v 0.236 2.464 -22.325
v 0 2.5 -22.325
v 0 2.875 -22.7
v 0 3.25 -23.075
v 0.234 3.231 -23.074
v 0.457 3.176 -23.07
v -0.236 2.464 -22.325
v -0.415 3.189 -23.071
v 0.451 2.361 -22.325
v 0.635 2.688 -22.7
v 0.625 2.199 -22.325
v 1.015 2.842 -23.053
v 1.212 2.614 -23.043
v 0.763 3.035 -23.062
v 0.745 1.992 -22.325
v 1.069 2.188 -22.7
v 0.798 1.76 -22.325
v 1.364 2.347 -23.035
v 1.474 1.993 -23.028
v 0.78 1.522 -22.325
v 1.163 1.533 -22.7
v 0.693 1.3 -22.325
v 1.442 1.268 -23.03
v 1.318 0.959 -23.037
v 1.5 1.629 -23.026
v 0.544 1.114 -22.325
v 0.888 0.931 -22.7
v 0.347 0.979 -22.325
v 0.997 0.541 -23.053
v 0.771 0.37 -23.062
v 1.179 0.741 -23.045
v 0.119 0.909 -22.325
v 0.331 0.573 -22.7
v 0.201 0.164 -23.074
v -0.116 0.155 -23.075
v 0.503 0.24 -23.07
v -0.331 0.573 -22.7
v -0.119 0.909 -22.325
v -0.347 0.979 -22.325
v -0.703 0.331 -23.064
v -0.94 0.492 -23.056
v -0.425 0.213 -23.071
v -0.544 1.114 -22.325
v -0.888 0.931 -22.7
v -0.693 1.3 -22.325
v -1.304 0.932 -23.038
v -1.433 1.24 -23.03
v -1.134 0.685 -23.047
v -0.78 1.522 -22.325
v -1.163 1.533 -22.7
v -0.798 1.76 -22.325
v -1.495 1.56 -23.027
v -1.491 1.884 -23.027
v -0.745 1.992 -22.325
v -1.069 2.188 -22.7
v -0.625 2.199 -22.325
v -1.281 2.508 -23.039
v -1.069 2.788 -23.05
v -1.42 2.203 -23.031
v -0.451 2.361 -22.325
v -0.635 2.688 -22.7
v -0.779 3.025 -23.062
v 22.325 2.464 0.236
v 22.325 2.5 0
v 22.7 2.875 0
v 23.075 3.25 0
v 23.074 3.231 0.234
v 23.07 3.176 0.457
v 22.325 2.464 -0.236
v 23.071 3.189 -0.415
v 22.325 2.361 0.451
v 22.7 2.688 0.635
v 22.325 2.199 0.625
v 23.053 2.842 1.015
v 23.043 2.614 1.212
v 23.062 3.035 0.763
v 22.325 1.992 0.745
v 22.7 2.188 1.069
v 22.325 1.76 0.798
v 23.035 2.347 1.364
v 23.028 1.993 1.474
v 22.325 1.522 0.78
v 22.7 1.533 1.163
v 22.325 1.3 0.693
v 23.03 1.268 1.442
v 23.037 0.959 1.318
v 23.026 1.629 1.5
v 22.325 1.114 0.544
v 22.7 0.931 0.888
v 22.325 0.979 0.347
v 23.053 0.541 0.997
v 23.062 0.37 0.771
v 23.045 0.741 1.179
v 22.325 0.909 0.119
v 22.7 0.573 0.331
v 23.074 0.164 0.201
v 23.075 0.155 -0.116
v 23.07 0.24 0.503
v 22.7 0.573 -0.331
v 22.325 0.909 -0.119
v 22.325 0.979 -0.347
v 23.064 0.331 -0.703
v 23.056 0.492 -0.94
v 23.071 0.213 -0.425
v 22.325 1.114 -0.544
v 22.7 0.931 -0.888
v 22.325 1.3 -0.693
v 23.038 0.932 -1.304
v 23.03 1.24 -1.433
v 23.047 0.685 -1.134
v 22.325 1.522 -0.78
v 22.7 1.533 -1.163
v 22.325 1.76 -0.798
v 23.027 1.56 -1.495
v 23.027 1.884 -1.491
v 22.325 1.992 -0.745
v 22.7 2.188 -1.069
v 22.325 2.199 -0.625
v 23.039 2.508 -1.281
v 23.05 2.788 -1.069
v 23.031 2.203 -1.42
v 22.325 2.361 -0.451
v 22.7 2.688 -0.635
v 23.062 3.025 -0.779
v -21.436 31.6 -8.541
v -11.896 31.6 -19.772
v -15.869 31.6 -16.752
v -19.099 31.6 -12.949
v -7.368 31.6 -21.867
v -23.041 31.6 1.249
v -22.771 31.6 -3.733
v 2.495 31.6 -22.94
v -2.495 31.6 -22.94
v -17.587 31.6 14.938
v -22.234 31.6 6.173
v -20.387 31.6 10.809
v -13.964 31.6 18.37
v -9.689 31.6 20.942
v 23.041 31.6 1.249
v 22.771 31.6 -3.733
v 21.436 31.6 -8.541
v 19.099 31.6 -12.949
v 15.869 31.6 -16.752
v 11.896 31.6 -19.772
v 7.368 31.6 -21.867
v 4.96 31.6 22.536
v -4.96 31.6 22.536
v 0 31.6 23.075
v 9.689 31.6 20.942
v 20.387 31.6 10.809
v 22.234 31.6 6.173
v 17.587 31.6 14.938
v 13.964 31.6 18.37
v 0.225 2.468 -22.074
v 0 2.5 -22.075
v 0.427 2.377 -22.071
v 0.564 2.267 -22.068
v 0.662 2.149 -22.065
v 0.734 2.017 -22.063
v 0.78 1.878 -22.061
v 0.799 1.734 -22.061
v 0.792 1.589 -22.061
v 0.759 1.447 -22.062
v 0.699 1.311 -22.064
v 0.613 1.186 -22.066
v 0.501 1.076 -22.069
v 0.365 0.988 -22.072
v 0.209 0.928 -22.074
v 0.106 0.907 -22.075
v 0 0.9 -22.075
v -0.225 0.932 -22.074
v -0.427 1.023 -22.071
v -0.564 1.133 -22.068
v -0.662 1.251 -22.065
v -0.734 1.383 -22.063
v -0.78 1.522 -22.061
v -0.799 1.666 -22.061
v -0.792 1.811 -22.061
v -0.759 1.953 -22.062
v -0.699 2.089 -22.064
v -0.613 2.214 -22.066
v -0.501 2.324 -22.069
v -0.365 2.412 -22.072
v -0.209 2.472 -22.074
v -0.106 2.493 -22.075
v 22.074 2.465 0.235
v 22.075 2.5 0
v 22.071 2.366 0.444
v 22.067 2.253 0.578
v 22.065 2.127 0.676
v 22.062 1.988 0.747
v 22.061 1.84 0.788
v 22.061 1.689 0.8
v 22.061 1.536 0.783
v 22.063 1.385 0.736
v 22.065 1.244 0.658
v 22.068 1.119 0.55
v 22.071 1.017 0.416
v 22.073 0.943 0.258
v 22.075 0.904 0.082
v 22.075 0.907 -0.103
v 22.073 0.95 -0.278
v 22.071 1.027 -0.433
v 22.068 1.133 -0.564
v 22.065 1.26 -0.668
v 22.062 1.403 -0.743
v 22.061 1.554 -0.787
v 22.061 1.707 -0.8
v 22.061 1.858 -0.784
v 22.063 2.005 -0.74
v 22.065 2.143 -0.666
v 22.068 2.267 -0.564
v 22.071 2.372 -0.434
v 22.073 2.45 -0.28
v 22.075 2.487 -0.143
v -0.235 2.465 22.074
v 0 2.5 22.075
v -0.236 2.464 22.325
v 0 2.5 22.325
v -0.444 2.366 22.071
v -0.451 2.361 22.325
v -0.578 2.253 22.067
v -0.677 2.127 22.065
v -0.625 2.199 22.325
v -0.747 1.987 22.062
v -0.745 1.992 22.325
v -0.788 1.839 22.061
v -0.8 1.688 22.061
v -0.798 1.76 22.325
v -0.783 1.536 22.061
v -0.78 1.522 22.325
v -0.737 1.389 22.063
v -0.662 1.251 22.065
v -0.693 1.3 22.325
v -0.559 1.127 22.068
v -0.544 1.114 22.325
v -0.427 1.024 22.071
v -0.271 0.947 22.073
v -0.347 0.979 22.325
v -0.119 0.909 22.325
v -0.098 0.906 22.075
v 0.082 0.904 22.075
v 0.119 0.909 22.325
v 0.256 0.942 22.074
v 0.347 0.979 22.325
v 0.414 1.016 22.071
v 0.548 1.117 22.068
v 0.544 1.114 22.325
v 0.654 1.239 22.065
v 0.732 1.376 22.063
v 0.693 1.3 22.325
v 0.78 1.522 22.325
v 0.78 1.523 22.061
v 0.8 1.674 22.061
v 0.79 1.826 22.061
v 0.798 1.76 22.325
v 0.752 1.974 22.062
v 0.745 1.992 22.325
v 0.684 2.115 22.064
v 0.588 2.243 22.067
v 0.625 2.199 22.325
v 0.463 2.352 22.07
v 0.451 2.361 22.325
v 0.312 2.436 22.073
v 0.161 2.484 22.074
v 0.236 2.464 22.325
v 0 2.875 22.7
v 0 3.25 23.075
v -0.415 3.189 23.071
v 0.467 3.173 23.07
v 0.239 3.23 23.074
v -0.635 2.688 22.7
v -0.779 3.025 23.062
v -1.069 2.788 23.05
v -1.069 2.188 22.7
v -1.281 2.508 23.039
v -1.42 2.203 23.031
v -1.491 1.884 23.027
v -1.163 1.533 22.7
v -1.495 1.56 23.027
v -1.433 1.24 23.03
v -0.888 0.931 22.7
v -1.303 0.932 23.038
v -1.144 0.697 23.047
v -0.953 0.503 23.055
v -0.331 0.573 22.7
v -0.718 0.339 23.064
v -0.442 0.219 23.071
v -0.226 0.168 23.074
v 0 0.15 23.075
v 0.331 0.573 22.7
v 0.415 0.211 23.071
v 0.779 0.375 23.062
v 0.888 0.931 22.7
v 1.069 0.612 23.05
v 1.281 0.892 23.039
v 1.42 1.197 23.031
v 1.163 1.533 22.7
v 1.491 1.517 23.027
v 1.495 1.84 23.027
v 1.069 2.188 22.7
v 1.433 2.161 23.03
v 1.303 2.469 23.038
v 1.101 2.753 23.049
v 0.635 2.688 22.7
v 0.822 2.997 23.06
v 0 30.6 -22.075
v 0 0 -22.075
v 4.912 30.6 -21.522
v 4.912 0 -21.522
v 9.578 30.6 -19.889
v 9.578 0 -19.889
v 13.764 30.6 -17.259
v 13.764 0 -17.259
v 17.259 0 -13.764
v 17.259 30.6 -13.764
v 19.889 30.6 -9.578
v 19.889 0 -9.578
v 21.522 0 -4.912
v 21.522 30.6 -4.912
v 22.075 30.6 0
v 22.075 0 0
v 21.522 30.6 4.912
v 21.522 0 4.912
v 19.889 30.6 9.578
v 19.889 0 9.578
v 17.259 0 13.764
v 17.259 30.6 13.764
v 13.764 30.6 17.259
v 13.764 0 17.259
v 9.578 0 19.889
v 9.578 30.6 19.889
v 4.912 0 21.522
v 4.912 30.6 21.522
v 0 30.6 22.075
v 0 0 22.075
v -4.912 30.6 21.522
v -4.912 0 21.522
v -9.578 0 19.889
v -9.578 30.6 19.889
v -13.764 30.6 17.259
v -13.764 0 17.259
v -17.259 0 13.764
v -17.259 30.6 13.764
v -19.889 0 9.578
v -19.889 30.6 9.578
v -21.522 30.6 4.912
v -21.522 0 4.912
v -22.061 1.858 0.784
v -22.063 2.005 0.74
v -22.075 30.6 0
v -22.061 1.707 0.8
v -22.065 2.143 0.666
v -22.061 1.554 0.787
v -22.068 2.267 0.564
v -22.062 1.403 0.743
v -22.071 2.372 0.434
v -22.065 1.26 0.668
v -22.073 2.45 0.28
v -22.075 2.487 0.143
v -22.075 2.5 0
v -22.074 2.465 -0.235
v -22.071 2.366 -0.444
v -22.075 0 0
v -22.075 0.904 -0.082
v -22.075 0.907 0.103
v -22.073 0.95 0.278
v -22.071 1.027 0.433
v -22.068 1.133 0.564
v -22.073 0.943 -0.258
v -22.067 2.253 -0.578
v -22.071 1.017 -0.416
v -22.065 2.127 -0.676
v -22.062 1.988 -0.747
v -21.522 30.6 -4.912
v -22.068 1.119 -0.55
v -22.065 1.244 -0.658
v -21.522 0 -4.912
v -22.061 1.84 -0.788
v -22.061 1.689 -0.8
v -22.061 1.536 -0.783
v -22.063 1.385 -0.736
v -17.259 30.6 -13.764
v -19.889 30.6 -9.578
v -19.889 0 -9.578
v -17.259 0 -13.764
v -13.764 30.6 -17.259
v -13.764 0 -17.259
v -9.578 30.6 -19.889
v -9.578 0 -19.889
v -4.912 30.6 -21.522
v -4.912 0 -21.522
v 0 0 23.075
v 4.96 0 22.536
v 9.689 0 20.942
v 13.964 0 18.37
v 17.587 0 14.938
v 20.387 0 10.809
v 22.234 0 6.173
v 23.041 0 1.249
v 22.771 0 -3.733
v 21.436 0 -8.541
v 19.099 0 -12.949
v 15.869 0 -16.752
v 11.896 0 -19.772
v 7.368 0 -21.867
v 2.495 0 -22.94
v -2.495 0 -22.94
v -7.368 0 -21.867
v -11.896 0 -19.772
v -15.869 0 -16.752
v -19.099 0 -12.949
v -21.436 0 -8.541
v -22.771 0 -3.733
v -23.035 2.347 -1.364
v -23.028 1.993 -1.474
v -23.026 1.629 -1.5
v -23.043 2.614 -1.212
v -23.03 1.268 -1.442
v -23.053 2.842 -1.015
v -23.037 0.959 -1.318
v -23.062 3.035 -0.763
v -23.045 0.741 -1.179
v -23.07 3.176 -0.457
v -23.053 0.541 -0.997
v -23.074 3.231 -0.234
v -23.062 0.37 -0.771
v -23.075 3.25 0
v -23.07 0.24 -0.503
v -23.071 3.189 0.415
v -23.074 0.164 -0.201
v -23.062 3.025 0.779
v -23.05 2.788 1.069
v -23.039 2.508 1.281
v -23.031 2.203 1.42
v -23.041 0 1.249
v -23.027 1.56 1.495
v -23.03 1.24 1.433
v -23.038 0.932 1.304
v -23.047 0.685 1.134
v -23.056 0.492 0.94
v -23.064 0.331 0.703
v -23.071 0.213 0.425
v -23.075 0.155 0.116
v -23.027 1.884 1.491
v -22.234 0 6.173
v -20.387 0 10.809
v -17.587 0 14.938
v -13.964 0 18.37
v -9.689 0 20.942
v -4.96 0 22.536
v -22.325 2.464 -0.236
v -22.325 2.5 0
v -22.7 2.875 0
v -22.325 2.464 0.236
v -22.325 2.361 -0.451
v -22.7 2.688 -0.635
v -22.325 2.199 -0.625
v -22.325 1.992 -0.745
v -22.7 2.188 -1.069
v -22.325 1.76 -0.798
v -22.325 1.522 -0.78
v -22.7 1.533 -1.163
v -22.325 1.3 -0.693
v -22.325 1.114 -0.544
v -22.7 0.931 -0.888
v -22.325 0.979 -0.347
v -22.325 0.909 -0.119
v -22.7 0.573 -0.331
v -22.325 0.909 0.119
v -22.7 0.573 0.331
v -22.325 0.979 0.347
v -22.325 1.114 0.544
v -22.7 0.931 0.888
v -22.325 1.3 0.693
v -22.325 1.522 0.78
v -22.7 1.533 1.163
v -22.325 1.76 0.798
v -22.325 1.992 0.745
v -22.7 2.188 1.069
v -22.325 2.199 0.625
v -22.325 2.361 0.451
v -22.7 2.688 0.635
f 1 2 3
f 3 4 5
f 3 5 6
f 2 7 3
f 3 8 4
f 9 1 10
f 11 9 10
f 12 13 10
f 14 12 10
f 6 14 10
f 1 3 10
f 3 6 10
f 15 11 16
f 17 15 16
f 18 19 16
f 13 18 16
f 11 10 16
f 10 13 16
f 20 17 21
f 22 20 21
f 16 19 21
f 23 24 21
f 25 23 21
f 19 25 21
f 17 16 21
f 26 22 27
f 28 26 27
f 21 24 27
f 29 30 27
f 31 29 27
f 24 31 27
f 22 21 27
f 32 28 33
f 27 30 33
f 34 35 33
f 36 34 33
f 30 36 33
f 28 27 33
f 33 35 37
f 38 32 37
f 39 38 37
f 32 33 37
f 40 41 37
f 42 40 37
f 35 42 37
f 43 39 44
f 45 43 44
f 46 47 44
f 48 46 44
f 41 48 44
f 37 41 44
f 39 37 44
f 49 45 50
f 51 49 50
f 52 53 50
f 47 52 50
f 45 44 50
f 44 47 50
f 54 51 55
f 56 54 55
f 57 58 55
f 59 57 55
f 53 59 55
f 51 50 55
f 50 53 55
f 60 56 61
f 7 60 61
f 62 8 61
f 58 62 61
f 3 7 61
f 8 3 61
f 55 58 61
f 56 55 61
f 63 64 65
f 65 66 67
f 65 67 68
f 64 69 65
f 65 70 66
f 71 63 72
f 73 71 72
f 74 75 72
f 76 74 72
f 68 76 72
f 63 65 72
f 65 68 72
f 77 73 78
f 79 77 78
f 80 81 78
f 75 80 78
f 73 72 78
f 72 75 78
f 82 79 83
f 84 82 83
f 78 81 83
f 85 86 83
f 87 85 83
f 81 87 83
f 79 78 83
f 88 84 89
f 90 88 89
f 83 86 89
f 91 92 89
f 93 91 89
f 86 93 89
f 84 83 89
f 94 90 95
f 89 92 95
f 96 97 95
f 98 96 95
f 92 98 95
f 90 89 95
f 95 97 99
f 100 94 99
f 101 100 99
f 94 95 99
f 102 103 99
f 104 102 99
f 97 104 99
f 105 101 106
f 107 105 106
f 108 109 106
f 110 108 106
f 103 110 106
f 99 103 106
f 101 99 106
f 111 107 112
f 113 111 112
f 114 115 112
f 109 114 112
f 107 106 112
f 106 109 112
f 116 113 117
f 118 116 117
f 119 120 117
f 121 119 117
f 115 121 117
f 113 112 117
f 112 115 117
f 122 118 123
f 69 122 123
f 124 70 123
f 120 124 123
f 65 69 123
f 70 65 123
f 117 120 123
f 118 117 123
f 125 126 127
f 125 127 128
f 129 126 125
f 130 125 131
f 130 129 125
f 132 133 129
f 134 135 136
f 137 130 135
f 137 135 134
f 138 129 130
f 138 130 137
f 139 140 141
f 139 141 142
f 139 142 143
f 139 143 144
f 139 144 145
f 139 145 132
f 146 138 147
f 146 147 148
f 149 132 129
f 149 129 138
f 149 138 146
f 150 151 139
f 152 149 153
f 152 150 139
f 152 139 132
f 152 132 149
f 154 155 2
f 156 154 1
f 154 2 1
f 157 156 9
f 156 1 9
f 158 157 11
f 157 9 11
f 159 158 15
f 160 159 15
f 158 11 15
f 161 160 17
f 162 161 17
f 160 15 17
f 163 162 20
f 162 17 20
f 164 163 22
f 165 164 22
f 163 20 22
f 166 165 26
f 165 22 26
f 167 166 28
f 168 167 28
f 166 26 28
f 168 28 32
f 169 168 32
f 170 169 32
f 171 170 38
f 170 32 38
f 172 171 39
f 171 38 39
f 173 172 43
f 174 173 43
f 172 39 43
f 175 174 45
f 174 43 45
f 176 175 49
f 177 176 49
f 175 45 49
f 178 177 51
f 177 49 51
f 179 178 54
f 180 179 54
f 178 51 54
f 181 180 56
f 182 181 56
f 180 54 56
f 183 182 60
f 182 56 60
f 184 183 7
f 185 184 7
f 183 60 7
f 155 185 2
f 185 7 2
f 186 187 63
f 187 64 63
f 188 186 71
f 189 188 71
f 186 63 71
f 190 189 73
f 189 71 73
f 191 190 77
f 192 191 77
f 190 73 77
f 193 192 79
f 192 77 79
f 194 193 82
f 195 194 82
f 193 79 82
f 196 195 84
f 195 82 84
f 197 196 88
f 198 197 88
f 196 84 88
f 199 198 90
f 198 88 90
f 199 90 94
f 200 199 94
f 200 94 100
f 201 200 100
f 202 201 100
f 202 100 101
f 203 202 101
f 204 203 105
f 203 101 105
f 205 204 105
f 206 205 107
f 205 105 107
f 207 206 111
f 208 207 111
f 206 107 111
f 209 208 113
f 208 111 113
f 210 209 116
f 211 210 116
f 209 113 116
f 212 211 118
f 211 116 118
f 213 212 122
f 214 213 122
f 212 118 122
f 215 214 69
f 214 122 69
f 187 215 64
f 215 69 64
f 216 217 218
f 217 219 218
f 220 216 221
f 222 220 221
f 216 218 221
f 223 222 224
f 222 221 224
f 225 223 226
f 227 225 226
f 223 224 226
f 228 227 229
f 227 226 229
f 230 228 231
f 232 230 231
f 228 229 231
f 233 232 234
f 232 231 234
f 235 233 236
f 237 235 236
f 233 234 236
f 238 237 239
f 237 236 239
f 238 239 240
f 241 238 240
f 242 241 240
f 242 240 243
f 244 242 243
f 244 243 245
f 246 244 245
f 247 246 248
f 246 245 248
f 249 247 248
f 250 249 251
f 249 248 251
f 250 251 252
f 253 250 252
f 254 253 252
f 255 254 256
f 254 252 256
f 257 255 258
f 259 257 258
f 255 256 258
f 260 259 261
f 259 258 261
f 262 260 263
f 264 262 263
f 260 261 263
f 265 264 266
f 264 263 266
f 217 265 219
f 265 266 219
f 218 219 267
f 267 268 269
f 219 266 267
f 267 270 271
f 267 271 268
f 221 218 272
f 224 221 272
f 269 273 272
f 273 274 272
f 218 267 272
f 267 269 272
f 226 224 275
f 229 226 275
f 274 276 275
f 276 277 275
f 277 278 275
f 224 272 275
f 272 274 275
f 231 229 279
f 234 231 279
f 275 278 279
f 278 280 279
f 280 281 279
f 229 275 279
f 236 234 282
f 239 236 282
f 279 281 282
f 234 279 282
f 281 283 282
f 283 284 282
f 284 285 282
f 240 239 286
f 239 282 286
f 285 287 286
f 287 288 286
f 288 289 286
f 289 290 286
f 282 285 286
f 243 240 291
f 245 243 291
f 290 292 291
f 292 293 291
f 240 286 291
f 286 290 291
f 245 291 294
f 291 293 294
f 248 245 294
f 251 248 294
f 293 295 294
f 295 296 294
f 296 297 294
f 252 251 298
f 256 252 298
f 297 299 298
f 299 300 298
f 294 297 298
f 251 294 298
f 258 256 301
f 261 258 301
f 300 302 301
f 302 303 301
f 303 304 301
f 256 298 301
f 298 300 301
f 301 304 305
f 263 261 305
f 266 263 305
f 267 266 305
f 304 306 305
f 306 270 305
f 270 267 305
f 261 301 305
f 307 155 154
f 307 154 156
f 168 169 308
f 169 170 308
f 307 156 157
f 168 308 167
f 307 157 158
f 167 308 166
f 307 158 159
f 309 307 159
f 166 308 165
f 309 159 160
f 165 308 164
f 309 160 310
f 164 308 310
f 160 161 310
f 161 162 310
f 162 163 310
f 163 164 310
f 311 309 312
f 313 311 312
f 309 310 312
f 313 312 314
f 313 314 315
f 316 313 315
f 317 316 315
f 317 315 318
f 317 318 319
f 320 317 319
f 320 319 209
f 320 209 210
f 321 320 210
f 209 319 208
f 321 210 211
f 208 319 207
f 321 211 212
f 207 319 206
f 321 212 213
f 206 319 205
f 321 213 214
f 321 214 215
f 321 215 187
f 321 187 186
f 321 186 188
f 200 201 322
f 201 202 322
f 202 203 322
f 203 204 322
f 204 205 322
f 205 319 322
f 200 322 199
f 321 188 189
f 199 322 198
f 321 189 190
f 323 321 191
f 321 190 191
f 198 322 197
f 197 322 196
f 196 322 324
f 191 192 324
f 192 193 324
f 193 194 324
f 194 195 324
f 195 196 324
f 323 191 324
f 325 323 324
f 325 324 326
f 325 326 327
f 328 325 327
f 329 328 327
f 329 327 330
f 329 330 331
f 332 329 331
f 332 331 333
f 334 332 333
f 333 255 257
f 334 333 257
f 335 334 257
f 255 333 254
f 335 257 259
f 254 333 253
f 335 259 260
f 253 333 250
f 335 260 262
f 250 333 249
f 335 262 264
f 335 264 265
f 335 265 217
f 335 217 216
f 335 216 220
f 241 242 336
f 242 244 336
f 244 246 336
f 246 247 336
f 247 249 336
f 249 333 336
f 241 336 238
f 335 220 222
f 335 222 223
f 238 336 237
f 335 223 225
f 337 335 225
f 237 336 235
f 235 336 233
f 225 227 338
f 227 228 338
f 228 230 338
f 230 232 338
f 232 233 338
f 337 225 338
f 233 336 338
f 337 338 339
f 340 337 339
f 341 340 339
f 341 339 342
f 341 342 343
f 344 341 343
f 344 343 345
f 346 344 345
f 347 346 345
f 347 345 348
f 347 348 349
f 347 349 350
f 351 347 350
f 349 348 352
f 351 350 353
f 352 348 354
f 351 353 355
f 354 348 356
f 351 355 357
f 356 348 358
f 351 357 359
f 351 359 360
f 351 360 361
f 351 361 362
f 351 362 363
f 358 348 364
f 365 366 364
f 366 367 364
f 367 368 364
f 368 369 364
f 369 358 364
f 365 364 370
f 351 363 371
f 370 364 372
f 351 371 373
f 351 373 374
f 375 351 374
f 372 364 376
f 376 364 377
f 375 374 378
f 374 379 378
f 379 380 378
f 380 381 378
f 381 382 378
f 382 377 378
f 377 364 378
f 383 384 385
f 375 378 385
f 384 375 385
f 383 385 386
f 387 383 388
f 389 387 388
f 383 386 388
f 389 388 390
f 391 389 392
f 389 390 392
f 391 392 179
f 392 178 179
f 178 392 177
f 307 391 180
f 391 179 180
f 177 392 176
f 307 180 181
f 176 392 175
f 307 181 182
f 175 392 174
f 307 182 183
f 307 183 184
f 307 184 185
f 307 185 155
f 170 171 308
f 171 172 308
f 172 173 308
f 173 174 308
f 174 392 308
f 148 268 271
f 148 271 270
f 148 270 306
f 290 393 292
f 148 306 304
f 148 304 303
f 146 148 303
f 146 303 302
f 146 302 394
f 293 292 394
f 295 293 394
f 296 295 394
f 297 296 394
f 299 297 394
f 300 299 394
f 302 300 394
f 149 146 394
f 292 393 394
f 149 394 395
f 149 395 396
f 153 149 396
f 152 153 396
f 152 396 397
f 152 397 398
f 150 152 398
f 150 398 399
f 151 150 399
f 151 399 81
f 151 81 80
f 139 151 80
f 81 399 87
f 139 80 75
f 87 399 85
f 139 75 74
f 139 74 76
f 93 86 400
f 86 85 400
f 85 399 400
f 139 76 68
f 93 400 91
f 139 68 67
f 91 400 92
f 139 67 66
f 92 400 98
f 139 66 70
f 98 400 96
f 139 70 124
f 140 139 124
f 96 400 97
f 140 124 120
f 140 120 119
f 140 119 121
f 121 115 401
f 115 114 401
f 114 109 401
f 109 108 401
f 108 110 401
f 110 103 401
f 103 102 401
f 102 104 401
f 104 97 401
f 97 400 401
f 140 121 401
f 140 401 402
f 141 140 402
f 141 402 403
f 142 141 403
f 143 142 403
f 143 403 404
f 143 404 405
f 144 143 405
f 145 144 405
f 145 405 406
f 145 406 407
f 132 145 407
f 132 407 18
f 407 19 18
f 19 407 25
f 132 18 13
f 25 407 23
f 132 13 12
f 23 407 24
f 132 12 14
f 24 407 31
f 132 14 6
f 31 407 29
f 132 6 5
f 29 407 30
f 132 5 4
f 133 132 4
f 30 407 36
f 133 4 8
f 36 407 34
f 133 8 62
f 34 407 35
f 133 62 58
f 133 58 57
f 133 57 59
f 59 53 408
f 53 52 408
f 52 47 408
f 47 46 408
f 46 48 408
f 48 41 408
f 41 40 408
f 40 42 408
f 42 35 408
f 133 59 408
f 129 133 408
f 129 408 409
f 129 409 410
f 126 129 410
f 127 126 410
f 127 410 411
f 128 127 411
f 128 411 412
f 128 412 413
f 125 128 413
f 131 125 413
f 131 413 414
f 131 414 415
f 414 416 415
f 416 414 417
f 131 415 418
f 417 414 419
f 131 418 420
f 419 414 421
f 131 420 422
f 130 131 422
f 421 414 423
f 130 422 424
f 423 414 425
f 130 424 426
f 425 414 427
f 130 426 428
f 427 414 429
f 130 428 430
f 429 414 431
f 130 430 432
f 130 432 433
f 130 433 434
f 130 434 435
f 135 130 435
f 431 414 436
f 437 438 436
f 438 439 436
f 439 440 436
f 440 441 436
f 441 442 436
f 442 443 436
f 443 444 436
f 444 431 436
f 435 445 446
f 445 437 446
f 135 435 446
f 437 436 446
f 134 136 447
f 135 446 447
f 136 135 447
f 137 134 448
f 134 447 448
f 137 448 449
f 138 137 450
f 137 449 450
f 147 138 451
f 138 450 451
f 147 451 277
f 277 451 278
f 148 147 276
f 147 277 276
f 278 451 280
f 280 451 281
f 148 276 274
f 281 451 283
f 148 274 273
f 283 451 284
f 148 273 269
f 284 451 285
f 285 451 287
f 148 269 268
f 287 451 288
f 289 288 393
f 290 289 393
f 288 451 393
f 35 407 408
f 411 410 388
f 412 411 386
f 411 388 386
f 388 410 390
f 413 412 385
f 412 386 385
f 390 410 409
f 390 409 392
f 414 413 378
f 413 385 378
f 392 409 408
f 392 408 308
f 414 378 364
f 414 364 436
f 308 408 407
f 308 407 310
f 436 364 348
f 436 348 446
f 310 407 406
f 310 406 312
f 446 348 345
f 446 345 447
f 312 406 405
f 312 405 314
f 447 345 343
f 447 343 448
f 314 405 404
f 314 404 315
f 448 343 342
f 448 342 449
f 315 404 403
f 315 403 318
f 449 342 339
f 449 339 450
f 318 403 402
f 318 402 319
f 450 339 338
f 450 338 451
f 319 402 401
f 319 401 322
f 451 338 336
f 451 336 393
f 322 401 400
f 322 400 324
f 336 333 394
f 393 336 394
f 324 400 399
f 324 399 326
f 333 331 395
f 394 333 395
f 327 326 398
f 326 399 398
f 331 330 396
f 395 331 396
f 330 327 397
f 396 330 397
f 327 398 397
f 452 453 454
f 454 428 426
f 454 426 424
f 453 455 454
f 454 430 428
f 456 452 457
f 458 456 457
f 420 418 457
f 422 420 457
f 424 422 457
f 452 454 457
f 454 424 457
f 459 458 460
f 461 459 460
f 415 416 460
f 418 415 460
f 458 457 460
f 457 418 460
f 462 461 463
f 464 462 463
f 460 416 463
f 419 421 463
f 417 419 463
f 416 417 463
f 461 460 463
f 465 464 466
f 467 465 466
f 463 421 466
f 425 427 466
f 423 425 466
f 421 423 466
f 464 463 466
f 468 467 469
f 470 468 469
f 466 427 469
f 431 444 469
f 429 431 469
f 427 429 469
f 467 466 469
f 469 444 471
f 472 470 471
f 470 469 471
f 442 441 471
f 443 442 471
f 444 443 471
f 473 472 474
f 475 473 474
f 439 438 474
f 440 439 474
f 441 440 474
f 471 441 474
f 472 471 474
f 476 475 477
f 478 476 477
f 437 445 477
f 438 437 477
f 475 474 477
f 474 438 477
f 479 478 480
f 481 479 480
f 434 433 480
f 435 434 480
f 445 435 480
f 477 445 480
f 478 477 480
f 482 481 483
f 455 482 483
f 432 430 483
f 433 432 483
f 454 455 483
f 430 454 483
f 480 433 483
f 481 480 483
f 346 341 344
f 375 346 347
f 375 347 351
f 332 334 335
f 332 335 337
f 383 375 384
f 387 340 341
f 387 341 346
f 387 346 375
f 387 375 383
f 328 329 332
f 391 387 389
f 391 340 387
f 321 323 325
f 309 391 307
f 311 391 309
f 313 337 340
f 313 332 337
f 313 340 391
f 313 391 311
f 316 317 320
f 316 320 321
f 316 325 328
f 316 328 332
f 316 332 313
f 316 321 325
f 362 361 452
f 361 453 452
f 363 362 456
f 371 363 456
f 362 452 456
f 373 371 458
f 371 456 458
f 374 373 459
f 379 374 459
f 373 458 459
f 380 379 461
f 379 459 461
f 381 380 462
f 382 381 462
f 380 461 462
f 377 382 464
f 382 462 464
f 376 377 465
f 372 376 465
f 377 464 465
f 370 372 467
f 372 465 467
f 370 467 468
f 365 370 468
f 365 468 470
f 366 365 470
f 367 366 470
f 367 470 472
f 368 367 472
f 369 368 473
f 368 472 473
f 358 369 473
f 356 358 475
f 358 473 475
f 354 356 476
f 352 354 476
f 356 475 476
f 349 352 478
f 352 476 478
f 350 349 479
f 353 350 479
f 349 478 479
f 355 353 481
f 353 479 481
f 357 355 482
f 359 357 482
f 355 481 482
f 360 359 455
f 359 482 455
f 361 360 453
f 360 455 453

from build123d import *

# Parameters (mm, degrees)
SKETCH3_R           = 23.075
BOSS_EXTRUDE3_DEPTH = 31.6
SKETCH4_R           = 22.075
CUT_EXTRUDE1_DEPTH  = 30.6
CIRPATTERN1_COUNT   = 4


# Read off the part's stored shape, not the designer's step: CSK for M2 Flat Head Machine Screw2
with BuildPart() as part:
    # Sketch3 → Boss-Extrude3 (new body)
    with BuildSketch(Plane(origin=(0, 0, 0), x_dir=(1, 0, 0), z_dir=(0, 1, 0))):
        with Locations(Location((0, 0, 0), (0, 0, 270))):
            Circle(SKETCH3_R)
    extrude(amount=BOSS_EXTRUDE3_DEPTH)

    # Sketch4 → Cut-Extrude1 (cut)
    with BuildSketch(Plane.XZ):
        with Locations(Location((0, 0, 0), (0, 0, 270))):
            Circle(SKETCH4_R)
    extrude(amount=-CUT_EXTRUDE1_DEPTH, mode=Mode.SUBTRACT)

    # CSK for M2 Flat Head Machine Screw2 outl → CSK for M2 Flat Head Machine Screw2 (revolve, cut)
    with BuildSketch(Plane(origin=(0, 1.7, 0), x_dir=(0, 1, 0), z_dir=(0, 0, -1))):
        Polygon((1.550011104, 23.075011104), (0, 23.075011104), (0, 22.060491405), (0.8, 22.060491405), (0.8, 22.325), align=None)
    csk_for_m2_flat_head_machine_screw2 = revolve(axis=Axis((0, 1.7, 0), (1, 0, 0)), mode=Mode.SUBTRACT)

    # CirPattern1: CSK for M2 Flat Head Machine Screw2 ×4 about axis
    cirpattern1_axis = Axis((0, 30.6, 0), (0, -1, 0))
    for i in range(1, CIRPATTERN1_COUNT):
        add(csk_for_m2_flat_head_machine_screw2.rotate(cirpattern1_axis, i * 360 / CIRPATTERN1_COUNT), mode=Mode.SUBTRACT)


solid = part.part
